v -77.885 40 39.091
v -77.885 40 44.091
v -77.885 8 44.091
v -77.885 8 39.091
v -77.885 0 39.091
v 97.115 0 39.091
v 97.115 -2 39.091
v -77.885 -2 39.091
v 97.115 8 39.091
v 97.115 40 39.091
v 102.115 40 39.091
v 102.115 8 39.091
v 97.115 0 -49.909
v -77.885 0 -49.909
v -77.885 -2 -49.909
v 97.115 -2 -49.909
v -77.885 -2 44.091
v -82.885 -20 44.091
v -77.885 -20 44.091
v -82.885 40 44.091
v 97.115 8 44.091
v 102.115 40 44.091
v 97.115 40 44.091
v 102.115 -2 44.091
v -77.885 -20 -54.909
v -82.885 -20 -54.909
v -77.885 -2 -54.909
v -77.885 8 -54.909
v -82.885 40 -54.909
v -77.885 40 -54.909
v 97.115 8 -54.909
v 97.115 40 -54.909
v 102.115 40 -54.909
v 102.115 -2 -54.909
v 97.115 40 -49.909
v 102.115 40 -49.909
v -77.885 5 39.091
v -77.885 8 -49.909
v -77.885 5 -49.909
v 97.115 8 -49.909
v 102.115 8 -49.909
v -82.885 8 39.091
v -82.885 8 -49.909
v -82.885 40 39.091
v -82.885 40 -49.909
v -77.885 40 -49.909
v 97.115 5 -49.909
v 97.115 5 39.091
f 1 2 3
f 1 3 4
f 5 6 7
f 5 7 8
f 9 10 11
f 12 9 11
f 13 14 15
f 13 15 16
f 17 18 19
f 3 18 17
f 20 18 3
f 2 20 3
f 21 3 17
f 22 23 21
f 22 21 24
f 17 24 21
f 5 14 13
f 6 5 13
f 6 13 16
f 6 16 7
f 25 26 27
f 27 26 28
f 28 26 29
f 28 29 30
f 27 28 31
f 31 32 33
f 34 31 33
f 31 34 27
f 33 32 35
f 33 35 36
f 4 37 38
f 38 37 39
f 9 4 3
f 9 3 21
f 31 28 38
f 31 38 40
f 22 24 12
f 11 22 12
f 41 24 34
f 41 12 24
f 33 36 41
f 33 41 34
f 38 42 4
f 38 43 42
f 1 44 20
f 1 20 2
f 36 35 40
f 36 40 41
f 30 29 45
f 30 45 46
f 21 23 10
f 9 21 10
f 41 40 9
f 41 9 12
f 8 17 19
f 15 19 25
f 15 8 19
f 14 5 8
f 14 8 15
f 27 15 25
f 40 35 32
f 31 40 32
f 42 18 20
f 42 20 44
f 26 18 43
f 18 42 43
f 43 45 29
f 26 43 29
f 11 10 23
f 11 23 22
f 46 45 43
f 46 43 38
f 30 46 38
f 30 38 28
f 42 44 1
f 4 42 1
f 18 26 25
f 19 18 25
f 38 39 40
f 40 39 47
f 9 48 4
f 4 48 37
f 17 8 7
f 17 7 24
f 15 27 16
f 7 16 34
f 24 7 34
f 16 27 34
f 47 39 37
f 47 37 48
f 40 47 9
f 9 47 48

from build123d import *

# Parameters (mm, degrees)
SKETCH_1_W      = 185
SKETCH_1_H      = 99
EXTRUDE_1_DEPTH = 5
SKETCH_3_W      = 185
SKETCH_3_H      = 99
SKETCH_3_W_2    = 175
SKETCH_3_H_2    = 89
EXTRUDE_2_DEPTH = 8
SKETCH_3_3_W    = 185
SKETCH_3_3_H    = 99
SKETCH_3_3_W_2  = 175
SKETCH_3_3_H_2  = 89
EXTRUDE_3_DEPTH = 2
SKETCH_4_W      = 5
SKETCH_4_H      = 99
EXTRUDE_4_DEPTH = 20
SKETCH_5_W      = 5
SKETCH_5_H      = 5
EXTRUDE_5_DEPTH = 40


with BuildPart() as part:
    # 草图1 → 凸台-拉伸1 (new body)
    with BuildSketch(Plane(origin=(0, 0, 0), x_dir=(1, 0, 0), z_dir=(0, 1, 0))):
        with Locations((9.615231102, 5.409140969)):
            Rectangle(SKETCH_1_W, SKETCH_1_H)
    extrude(amount=EXTRUDE_1_DEPTH)

    # 草图3 → 凸台-拉伸2 (add)
    with BuildSketch(Plane(origin=(0, 0, 0), x_dir=(1, 0, 0), z_dir=(0, 1, 0))):
        with Locations((9.615231102, 5.409140969)):
            Rectangle(SKETCH_3_W, SKETCH_3_H)
        with Locations((9.615231102, 5.409140969)):
            Rectangle(SKETCH_3_W_2, SKETCH_3_H_2, mode=Mode.SUBTRACT)
    extrude(amount=EXTRUDE_2_DEPTH)

    # 草图3<3> → 凸台-拉伸3 (add)
    with BuildSketch(Plane(origin=(0, 0, 0), x_dir=(1, 0, 0), z_dir=(0, 1, 0))):
        with Locations((9.615231102, 5.409140969)):
            Rectangle(SKETCH_3_3_W, SKETCH_3_3_H)
        with Locations((9.615231102, 5.409140969)):
            Rectangle(SKETCH_3_3_W_2, SKETCH_3_3_H_2, mode=Mode.SUBTRACT)
    extrude(amount=-EXTRUDE_3_DEPTH)

    # 草图4 → 凸台-拉伸4 (add)
    with BuildSketch(Plane(origin=(0, 0, 0), x_dir=(1, 0, 0), z_dir=(0, 1, 0))):
        with Locations((-80.384768898, 5.409140969)):
            Rectangle(SKETCH_4_W, SKETCH_4_H)
    extrude(amount=-EXTRUDE_4_DEPTH)

    # 草图5 → 凸台-拉伸5 (add)
    with BuildSketch(Plane(origin=(0, 0, 0), x_dir=(1, 0, 0), z_dir=(0, 1, 0))):
        with Locations((-80.384768898, 52.409140969)):
            Rectangle(SKETCH_5_W, SKETCH_5_H)
        with Locations((99.615231102, 52.409140969)):
            Rectangle(SKETCH_5_W, SKETCH_5_H)
        with Locations((99.615231102, -41.590859031)):
            Rectangle(SKETCH_5_W, SKETCH_5_H)
        with Locations((-80.384768898, -41.590859031)):
            Rectangle(SKETCH_5_W, SKETCH_5_H)
    extrude(amount=EXTRUDE_5_DEPTH)


solid = part.part
